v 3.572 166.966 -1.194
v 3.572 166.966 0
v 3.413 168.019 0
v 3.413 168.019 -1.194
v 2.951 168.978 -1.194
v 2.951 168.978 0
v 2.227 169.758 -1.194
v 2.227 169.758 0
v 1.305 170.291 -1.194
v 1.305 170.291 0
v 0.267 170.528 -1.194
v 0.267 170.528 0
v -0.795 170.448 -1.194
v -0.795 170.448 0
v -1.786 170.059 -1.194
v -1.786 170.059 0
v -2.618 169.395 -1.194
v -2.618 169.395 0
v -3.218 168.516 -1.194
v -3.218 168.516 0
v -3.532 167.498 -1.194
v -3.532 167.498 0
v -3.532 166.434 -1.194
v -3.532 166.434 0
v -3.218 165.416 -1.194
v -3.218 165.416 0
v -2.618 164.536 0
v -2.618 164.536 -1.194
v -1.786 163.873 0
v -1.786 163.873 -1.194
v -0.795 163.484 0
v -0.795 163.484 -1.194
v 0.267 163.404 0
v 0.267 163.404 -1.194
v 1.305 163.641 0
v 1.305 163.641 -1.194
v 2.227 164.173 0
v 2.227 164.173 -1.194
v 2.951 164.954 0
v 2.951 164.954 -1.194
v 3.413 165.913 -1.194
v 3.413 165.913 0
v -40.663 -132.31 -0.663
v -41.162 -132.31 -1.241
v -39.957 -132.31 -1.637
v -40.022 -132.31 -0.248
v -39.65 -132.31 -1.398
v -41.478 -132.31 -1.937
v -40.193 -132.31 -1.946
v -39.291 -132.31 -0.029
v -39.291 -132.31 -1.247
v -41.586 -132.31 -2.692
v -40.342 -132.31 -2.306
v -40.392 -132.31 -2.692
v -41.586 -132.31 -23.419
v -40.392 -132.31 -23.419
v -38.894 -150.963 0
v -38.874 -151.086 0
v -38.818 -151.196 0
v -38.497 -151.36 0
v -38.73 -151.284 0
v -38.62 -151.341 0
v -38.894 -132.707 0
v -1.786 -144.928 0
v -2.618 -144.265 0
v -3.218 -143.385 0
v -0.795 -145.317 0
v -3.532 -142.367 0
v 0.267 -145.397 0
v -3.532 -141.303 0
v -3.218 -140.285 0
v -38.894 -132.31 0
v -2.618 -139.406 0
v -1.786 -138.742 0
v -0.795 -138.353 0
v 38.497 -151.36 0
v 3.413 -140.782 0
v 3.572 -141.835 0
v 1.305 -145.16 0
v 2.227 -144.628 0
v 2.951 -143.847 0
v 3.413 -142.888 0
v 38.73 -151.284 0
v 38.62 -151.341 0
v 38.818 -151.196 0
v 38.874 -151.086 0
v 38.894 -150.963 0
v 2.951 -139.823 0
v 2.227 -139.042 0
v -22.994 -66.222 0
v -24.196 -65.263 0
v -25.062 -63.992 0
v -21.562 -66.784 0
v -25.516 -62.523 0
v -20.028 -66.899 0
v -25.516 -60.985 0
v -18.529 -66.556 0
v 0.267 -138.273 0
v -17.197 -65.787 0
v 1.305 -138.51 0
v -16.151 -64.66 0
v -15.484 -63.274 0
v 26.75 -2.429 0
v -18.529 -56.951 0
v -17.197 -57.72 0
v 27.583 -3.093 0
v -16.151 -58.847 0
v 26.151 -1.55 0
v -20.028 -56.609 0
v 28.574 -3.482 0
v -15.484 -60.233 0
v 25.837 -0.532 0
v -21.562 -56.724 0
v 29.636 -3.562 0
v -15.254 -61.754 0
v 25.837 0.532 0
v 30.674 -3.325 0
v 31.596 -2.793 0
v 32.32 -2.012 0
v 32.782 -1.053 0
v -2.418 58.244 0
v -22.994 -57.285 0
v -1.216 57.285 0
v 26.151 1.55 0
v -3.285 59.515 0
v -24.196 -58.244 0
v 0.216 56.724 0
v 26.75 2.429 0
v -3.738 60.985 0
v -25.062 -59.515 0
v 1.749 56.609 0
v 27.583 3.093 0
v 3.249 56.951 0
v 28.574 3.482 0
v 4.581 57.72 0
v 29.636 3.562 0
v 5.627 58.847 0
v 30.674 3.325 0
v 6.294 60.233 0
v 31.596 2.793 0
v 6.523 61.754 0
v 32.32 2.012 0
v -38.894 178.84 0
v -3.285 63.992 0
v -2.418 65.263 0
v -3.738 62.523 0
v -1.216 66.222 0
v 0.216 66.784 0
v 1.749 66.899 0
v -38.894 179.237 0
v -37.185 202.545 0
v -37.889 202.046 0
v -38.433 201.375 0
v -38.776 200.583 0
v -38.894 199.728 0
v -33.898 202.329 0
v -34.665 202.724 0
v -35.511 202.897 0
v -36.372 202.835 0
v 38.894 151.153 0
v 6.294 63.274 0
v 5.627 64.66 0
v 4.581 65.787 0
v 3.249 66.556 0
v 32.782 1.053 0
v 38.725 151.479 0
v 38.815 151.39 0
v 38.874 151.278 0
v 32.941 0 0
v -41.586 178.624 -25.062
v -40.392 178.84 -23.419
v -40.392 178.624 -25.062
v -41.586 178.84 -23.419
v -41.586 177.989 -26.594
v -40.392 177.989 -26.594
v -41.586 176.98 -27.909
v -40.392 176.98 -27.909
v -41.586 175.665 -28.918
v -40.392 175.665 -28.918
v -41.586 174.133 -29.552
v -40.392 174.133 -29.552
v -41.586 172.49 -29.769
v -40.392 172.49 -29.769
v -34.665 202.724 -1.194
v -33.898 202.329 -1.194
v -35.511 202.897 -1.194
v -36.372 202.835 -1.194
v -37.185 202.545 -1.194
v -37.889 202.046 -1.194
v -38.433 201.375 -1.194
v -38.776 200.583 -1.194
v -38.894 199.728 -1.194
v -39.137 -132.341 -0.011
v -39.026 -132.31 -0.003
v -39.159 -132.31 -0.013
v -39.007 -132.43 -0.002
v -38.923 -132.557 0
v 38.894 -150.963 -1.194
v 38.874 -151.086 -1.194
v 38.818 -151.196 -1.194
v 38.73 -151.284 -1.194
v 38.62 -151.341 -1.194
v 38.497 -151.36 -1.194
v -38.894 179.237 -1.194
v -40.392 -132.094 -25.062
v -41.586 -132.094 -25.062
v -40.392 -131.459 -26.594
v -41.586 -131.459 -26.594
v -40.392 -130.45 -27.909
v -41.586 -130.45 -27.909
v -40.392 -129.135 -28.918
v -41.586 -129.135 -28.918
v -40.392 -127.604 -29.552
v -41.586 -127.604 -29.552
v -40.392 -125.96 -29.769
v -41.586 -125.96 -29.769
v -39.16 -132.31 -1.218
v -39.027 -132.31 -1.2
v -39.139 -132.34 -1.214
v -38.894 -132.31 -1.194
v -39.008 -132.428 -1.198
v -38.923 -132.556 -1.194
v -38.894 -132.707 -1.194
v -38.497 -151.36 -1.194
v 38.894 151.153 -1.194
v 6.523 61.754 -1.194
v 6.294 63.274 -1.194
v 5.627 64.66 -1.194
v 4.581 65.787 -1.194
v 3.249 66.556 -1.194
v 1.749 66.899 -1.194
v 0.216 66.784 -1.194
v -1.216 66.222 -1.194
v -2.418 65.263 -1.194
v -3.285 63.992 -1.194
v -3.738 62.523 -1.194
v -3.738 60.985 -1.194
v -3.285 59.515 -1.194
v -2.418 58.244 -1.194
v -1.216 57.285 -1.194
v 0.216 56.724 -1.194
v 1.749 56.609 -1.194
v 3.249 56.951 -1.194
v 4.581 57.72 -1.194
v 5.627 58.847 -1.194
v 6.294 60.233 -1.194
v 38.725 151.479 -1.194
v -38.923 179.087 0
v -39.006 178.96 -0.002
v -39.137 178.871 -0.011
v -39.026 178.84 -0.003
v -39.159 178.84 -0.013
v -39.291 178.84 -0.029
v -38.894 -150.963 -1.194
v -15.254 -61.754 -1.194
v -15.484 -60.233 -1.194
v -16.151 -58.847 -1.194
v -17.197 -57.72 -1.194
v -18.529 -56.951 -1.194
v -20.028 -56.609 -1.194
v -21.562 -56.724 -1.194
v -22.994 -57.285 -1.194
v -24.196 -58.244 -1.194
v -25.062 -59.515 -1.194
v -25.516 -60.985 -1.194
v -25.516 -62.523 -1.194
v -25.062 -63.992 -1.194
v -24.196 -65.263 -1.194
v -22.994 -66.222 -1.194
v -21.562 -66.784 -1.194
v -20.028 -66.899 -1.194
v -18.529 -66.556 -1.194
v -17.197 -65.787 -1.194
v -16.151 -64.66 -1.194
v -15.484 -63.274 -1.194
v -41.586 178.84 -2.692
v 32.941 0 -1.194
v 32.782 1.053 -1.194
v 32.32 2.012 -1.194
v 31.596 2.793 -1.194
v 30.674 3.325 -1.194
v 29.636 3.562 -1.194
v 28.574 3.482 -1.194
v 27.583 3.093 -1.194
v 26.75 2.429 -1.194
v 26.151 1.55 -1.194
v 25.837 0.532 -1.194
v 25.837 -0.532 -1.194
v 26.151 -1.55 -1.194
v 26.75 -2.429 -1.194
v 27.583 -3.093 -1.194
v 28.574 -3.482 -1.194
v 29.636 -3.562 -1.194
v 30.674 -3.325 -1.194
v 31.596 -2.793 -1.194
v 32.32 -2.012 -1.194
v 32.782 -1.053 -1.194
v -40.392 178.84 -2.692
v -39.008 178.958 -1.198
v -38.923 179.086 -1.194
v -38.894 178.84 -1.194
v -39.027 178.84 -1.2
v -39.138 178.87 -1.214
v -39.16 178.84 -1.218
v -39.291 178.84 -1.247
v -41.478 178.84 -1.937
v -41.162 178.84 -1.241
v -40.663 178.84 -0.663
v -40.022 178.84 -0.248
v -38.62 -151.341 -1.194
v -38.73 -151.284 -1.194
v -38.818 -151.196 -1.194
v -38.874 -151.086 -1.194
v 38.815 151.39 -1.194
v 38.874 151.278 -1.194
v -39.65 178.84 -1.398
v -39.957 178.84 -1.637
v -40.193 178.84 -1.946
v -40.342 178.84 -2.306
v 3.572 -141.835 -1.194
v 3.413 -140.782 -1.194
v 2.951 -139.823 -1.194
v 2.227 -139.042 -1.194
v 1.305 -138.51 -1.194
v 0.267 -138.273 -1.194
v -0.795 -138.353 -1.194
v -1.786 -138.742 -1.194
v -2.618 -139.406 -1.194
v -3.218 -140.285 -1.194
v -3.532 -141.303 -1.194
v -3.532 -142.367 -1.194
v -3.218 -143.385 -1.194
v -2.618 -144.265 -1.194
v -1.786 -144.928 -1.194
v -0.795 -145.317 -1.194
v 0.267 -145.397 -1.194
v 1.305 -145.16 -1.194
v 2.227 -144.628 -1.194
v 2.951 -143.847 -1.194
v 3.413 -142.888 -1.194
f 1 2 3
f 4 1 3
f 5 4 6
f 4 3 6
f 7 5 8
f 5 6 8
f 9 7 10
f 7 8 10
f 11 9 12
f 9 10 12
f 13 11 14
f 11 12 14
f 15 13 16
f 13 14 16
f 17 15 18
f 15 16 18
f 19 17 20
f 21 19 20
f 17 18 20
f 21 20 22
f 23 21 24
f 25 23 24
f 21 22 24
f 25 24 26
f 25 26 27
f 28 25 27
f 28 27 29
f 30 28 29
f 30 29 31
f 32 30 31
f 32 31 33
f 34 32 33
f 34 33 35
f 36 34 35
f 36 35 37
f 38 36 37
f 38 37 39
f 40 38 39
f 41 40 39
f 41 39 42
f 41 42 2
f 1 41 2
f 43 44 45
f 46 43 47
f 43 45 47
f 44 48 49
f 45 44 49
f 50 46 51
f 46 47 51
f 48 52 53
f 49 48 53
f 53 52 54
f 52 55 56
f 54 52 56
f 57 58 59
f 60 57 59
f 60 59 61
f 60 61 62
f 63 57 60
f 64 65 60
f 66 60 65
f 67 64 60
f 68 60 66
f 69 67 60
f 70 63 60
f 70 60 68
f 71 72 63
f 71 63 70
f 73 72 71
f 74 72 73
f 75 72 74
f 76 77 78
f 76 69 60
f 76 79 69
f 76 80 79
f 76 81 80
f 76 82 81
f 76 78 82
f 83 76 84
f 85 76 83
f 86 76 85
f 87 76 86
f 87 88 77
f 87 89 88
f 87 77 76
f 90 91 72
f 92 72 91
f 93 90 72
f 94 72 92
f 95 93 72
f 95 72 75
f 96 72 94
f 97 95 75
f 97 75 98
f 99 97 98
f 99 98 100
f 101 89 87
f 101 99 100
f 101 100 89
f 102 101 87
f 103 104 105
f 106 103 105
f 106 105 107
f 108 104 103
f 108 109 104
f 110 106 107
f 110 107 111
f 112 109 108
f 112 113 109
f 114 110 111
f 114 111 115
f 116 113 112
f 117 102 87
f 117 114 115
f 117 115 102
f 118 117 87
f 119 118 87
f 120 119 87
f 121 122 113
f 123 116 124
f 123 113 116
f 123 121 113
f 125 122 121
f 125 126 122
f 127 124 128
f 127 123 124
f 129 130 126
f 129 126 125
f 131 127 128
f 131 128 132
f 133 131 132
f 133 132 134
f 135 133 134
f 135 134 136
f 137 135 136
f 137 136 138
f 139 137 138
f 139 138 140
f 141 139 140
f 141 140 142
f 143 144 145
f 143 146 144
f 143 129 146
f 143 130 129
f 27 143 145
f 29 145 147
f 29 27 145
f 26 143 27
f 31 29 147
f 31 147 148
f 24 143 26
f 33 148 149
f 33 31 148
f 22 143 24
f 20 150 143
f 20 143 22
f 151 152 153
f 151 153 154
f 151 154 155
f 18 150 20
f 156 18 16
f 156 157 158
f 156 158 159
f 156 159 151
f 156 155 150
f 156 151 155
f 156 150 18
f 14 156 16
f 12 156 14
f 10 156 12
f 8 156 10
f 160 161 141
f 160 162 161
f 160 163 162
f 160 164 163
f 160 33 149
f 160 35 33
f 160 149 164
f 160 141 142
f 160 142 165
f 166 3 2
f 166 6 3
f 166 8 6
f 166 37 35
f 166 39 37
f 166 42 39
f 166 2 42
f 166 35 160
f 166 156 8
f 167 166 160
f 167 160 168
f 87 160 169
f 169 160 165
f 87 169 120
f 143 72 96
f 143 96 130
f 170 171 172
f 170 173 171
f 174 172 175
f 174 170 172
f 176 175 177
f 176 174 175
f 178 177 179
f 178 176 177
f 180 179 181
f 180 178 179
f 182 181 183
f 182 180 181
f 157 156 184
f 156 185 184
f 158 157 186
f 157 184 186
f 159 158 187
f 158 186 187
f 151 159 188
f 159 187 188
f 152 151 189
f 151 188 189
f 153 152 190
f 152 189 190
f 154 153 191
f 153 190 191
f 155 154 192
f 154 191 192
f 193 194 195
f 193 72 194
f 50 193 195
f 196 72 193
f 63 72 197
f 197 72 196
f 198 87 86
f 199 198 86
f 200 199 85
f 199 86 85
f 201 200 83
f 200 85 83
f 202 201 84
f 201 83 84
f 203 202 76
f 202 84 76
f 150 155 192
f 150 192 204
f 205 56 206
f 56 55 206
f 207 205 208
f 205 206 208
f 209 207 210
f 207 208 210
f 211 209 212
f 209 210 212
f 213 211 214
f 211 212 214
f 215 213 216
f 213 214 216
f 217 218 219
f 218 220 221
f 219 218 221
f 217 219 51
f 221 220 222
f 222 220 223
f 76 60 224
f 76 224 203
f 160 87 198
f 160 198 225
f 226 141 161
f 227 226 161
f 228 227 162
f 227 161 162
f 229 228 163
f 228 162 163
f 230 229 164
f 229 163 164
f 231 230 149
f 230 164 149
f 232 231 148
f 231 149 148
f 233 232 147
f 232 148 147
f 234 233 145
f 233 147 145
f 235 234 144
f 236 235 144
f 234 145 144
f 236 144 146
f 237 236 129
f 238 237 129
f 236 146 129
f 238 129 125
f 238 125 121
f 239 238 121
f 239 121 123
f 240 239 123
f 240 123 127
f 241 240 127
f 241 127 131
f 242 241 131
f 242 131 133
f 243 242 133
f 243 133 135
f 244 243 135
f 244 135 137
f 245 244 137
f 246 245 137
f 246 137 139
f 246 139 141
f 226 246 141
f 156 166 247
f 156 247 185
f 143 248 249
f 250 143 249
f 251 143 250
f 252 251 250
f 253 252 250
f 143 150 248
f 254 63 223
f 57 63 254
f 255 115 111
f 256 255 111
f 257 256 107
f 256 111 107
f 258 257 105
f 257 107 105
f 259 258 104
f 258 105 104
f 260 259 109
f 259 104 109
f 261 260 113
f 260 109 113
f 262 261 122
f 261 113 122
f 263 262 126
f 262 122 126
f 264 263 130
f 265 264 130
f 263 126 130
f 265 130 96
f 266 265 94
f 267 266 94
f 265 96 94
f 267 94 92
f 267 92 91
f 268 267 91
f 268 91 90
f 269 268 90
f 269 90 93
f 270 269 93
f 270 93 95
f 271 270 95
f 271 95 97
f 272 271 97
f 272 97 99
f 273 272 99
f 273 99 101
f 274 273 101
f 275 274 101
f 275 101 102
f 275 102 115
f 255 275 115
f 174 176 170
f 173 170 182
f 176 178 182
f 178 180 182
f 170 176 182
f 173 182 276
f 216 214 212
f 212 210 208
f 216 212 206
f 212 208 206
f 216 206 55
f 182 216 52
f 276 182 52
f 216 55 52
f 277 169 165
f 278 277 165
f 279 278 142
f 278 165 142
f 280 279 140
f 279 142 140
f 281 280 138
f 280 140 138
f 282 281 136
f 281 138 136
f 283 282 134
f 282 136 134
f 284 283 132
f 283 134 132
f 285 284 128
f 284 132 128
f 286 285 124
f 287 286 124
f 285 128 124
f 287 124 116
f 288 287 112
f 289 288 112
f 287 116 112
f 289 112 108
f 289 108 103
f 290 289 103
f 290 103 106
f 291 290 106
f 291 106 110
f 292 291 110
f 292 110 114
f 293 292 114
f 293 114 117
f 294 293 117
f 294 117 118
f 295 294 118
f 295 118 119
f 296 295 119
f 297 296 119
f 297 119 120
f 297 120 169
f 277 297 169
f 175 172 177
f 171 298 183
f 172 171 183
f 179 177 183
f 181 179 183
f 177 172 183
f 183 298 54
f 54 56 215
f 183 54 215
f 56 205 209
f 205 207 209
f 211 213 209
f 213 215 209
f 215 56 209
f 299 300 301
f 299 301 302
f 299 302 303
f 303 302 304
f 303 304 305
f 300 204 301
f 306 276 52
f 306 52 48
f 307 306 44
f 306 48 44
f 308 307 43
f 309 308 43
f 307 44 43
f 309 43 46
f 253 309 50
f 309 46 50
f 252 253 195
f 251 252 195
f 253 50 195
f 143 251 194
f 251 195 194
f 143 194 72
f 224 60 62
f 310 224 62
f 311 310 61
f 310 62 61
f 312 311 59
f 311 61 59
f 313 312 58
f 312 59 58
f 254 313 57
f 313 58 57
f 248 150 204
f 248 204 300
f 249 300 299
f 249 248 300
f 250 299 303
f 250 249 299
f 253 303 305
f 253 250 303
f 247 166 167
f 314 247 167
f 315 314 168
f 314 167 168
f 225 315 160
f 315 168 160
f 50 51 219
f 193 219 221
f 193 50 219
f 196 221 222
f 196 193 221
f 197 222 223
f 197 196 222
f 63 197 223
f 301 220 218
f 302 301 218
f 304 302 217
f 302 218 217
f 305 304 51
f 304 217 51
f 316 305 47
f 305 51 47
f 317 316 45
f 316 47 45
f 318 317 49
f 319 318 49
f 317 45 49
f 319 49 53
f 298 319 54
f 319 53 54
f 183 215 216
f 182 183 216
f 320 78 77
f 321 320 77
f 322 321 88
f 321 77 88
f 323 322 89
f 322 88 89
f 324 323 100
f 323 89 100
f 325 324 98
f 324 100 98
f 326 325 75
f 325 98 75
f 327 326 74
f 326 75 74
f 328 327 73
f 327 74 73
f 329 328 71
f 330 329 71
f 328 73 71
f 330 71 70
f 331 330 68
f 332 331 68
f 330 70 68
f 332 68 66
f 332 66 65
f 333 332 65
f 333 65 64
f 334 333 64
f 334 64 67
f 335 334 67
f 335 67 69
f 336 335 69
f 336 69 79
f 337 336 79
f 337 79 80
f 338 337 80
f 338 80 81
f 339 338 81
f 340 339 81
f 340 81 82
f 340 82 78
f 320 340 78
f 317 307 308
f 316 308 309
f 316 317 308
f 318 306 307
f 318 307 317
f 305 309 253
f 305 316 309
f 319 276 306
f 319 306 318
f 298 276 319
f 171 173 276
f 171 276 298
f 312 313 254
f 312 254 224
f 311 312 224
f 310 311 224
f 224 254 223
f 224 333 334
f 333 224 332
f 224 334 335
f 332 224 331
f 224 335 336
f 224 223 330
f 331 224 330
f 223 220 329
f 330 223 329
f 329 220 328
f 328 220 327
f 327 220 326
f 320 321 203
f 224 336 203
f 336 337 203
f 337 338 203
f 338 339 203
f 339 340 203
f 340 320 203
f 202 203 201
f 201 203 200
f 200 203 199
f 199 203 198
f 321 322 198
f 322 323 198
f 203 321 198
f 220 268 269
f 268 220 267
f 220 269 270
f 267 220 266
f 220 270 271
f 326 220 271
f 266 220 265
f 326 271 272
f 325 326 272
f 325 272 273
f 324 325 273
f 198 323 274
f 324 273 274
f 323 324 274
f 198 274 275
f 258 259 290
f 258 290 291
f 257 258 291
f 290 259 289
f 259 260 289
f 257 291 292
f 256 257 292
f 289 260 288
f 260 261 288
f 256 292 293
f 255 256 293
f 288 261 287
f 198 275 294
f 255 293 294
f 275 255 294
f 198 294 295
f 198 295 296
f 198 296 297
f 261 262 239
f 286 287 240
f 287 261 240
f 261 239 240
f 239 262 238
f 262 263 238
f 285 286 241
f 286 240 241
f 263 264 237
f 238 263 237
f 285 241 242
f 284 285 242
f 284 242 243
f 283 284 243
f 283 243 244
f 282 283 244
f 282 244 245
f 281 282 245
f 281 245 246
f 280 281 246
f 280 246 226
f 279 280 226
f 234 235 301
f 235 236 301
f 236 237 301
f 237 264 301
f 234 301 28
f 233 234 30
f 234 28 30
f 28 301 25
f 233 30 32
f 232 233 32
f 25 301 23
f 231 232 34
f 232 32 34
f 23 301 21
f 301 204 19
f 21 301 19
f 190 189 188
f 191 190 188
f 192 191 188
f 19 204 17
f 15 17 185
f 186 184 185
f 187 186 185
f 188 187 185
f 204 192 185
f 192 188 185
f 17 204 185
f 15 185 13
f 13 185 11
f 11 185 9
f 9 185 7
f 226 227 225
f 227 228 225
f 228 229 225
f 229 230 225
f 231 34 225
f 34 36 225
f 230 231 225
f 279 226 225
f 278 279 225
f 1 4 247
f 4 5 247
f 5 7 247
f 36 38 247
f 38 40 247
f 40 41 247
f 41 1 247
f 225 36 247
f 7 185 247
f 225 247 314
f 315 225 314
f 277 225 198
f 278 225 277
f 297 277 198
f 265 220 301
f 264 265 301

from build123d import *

# Parameters (mm, degrees)
BASE_FLANGE1_DEPTH  = 1.1938
MITER_START         = -132.310053061
MITER_FLANGE1_DEPTH = 311.15
FILLET2_R           = 3.175
CUT_EXTRUDE1_REACH  = 211.249
SKETCH12_R          = 3.571875
SKETCH13_R          = 5.159375
CUT_EXTRUDE2_DEPTH  = 210.249492514
FILLET3_R           = 6.35
FILLET4_R           = 0.396875


# Read off the part's stored shape, not the designer's step: Miter Flange1
# Sheet-metal steps are written as plain solids
with BuildPart() as part:
    # Sketch1 → Base-Flange1 (new body)
    with BuildSketch(Plane.XY):
        Polygon((-38.89375, -151.360053061), (38.89375, -151.360053061), (38.89375, 151.360053061), (-38.89375, 205.827446939), (-38.89375, 151.360053061), align=None)
    extrude(amount=-BASE_FLANGE1_DEPTH)

    # Miter Flange1 outline → Miter Flange1 (add)
    with BuildSketch(Plane(origin=(0, 0, 0), x_dir=(1, 0, 0), z_dir=(0, 1, 0)).offset(MITER_START)):
        with BuildLine():
            Line((-40.39235, 29.7688), (-41.58615, 29.7688))
            Line((-41.58615, 29.7688), (-41.58615, 2.6924))
            ThreePointArc((-41.58615, 2.6924), (-40.797564298, 0.788585702), (-38.89375, 0))
            Line((-38.89375, 0), (-38.89375, 1.1938))
            ThreePointArc((-38.89375, 1.1938), (-39.953420222, 1.632729778), (-40.39235, 2.6924))
            Line((-40.39235, 2.6924), (-40.39235, 29.7688))
        make_face()
    extrude(amount=MITER_FLANGE1_DEPTH)

    # Fillet2
    fillet2_edges = [part.edges().sort_by_distance(p)[0] for p in [
        (-38.89375, 205.827446939, -0.5969),
    ]]
    fillet(fillet2_edges, radius=FILLET2_R)

    # Sketch12 → Cut-Extrude1 (cut, up to next)
    with BuildSketch(Plane.XY, mode=Mode.PRIVATE) as cut_extrude1_sk1:
        with Locations((29.36875, 0)):
            Circle(SKETCH12_R)
    cut_extrude1_tool1 = extrude(cut_extrude1_sk1.sketch, amount=-CUT_EXTRUDE1_REACH, mode=Mode.PRIVATE) & part.part
    # Sketch12 → Cut-Extrude1 (cut, up to next)
    with BuildSketch(Plane.XY, mode=Mode.PRIVATE) as cut_extrude1_sk2:
        with Locations((0, -141.835053061)):
            Circle(SKETCH12_R)
    cut_extrude1_tool2 = extrude(cut_extrude1_sk2.sketch, amount=-CUT_EXTRUDE1_REACH, mode=Mode.PRIVATE) & part.part
    # Sketch12 → Cut-Extrude1 (cut, up to next)
    with BuildSketch(Plane.XY, mode=Mode.PRIVATE) as cut_extrude1_sk3:
        with Locations((0, 166.965872042)):
            Circle(SKETCH12_R)
    cut_extrude1_tool3 = extrude(cut_extrude1_sk3.sketch, amount=-CUT_EXTRUDE1_REACH, mode=Mode.PRIVATE) & part.part
    add(cut_extrude1_tool1.solids().sort_by_distance((29.36875, 0, 0))[0], mode=Mode.SUBTRACT)
    add(cut_extrude1_tool2.solids().sort_by_distance((0, -141.835053, 0))[0], mode=Mode.SUBTRACT)
    add(cut_extrude1_tool3.solids().sort_by_distance((0, 166.965872, 0))[0], mode=Mode.SUBTRACT)

    # Sketch13 → Cut-Extrude2 (cut, through all)
    with BuildSketch(Plane.XY):
        with Locations((1.363826041, 61.753601162)):
            Circle(SKETCH13_R)
        with Locations((-20.413826041, -61.753601162)):
            Circle(SKETCH13_R)
    extrude(amount=-CUT_EXTRUDE2_DEPTH, mode=Mode.SUBTRACT)

    # Fillet3
    fillet3_edges = [part.edges().sort_by_distance(p)[0] for p in [
        (-40.98925, -132.310053061, -29.7688),
        (-40.98925, 178.839946939, -29.7688),
    ]]
    fillet(fillet3_edges, radius=FILLET3_R)

    # Fillet4
    # the kernel refuses this fillet: 0.396875 mm, written as the material it adds along each edge
    with BuildSketch(Plane(origin=(-38.89375, -132.310053061, 0.9921875), x_dir=(-1, 0, 0), z_dir=(0, 0, -1))) as fillet4_piece_1_section:
        with BuildLine():
            CenterArc((FILLET4_R, -FILLET4_R), FILLET4_R, 90, 90)
            Line((0, -FILLET4_R), (0, 0))
            Line((0, 0), (FILLET4_R, 0))
        make_face()
    fillet4_piece_1 = extrude(amount=3.178175, mode=Mode.PRIVATE)
    fillet4_piece_1 = fillet4_piece_1 & Plane(origin=(-38.893750001, -132.398815537, -2.692399999), x_dir=(-1.0, 0, -4.2270187104329246e-10), z_dir=(0, -1, 0)) * Cylinder(2.692399999, 8, mode=Mode.PRIVATE)
    fillet4_piece_1 = fillet4_piece_1 - Plane(origin=(-38.893749999, -132.398815537, -2.692400001), x_dir=(-6.519535415155748e-10, 0, 1.0), z_dir=(0, -1, 0)) * Cylinder(1.498600001, 8, mode=Mode.PRIVATE)
    add(fillet4_piece_1)
    with BuildSketch(Plane(origin=(-38.89375, 178.839946939, 0.9921875), x_dir=(-1, 0, 0), z_dir=(0, 0, -1))) as fillet4_piece_2_section:
        with BuildLine():
            CenterArc((FILLET4_R, FILLET4_R), FILLET4_R, 180, 90)
            Line((0, FILLET4_R), (0, 0))
            Line((0, 0), (FILLET4_R, 0))
        make_face()
    fillet4_piece_2 = extrude(amount=3.178175, mode=Mode.PRIVATE)
    fillet4_piece_2 = fillet4_piece_2 & Plane(origin=(-38.893750001, 178.928709436, -2.692399999), x_dir=(-1.0, 0, -4.2270187104329246e-10), z_dir=(0, -1, 0)) * Cylinder(2.692399999, 8, mode=Mode.PRIVATE)
    fillet4_piece_2 = fillet4_piece_2 - Plane(origin=(-38.893749999, 178.928709436, -2.692400001), x_dir=(-6.519535415155748e-10, 0, 1.0), z_dir=(0, -1, 0)) * Cylinder(1.498600001, 8, mode=Mode.PRIVATE)
    add(fillet4_piece_2)
    # the kernel refuses this fillet: 0.396875 mm, written as the material it takes off along each edge
    with BuildSketch(Plane(origin=(38.89375, 151.360053061, 0.51650012), x_dir=(0, -1, 0), z_dir=(0, 0, -1))) as fillet4_2_piece_1:
        with BuildLine():
            CenterArc((FILLET4_R * 0.520567050552, FILLET4_R), FILLET4_R, 215, 55)
            Line((-FILLET4_R * 0.298584993737, FILLET4_R * 0.426423563649), (0, 0))
            Line((0, 0), (FILLET4_R * 0.520567050552, 0))
        make_face()
    extrude(amount=2.226800241, mode=Mode.SUBTRACT)
    with BuildSketch(Plane(origin=(38.89375, -151.360053061, 0.9921875), x_dir=(0, 1, 0), z_dir=(0, 0, -1))) as fillet4_2_piece_2:
        with BuildLine():
            CenterArc((FILLET4_R, -FILLET4_R), FILLET4_R, 90, 90)
            Line((0, -FILLET4_R), (0, 0))
            Line((0, 0), (FILLET4_R, 0))
        make_face()
    extrude(amount=3.178175, mode=Mode.SUBTRACT)
    with BuildSketch(Plane(origin=(-38.89375, -151.360053061, 0.9921875), x_dir=(0, 1, 0), z_dir=(0, 0, -1))) as fillet4_2_piece_3:
        with BuildLine():
            CenterArc((FILLET4_R, FILLET4_R), FILLET4_R, 180, 90)
            Line((0, FILLET4_R), (0, 0))
            Line((0, 0), (FILLET4_R, 0))
        make_face()
    extrude(amount=3.178175, mode=Mode.SUBTRACT)


solid = part.part
